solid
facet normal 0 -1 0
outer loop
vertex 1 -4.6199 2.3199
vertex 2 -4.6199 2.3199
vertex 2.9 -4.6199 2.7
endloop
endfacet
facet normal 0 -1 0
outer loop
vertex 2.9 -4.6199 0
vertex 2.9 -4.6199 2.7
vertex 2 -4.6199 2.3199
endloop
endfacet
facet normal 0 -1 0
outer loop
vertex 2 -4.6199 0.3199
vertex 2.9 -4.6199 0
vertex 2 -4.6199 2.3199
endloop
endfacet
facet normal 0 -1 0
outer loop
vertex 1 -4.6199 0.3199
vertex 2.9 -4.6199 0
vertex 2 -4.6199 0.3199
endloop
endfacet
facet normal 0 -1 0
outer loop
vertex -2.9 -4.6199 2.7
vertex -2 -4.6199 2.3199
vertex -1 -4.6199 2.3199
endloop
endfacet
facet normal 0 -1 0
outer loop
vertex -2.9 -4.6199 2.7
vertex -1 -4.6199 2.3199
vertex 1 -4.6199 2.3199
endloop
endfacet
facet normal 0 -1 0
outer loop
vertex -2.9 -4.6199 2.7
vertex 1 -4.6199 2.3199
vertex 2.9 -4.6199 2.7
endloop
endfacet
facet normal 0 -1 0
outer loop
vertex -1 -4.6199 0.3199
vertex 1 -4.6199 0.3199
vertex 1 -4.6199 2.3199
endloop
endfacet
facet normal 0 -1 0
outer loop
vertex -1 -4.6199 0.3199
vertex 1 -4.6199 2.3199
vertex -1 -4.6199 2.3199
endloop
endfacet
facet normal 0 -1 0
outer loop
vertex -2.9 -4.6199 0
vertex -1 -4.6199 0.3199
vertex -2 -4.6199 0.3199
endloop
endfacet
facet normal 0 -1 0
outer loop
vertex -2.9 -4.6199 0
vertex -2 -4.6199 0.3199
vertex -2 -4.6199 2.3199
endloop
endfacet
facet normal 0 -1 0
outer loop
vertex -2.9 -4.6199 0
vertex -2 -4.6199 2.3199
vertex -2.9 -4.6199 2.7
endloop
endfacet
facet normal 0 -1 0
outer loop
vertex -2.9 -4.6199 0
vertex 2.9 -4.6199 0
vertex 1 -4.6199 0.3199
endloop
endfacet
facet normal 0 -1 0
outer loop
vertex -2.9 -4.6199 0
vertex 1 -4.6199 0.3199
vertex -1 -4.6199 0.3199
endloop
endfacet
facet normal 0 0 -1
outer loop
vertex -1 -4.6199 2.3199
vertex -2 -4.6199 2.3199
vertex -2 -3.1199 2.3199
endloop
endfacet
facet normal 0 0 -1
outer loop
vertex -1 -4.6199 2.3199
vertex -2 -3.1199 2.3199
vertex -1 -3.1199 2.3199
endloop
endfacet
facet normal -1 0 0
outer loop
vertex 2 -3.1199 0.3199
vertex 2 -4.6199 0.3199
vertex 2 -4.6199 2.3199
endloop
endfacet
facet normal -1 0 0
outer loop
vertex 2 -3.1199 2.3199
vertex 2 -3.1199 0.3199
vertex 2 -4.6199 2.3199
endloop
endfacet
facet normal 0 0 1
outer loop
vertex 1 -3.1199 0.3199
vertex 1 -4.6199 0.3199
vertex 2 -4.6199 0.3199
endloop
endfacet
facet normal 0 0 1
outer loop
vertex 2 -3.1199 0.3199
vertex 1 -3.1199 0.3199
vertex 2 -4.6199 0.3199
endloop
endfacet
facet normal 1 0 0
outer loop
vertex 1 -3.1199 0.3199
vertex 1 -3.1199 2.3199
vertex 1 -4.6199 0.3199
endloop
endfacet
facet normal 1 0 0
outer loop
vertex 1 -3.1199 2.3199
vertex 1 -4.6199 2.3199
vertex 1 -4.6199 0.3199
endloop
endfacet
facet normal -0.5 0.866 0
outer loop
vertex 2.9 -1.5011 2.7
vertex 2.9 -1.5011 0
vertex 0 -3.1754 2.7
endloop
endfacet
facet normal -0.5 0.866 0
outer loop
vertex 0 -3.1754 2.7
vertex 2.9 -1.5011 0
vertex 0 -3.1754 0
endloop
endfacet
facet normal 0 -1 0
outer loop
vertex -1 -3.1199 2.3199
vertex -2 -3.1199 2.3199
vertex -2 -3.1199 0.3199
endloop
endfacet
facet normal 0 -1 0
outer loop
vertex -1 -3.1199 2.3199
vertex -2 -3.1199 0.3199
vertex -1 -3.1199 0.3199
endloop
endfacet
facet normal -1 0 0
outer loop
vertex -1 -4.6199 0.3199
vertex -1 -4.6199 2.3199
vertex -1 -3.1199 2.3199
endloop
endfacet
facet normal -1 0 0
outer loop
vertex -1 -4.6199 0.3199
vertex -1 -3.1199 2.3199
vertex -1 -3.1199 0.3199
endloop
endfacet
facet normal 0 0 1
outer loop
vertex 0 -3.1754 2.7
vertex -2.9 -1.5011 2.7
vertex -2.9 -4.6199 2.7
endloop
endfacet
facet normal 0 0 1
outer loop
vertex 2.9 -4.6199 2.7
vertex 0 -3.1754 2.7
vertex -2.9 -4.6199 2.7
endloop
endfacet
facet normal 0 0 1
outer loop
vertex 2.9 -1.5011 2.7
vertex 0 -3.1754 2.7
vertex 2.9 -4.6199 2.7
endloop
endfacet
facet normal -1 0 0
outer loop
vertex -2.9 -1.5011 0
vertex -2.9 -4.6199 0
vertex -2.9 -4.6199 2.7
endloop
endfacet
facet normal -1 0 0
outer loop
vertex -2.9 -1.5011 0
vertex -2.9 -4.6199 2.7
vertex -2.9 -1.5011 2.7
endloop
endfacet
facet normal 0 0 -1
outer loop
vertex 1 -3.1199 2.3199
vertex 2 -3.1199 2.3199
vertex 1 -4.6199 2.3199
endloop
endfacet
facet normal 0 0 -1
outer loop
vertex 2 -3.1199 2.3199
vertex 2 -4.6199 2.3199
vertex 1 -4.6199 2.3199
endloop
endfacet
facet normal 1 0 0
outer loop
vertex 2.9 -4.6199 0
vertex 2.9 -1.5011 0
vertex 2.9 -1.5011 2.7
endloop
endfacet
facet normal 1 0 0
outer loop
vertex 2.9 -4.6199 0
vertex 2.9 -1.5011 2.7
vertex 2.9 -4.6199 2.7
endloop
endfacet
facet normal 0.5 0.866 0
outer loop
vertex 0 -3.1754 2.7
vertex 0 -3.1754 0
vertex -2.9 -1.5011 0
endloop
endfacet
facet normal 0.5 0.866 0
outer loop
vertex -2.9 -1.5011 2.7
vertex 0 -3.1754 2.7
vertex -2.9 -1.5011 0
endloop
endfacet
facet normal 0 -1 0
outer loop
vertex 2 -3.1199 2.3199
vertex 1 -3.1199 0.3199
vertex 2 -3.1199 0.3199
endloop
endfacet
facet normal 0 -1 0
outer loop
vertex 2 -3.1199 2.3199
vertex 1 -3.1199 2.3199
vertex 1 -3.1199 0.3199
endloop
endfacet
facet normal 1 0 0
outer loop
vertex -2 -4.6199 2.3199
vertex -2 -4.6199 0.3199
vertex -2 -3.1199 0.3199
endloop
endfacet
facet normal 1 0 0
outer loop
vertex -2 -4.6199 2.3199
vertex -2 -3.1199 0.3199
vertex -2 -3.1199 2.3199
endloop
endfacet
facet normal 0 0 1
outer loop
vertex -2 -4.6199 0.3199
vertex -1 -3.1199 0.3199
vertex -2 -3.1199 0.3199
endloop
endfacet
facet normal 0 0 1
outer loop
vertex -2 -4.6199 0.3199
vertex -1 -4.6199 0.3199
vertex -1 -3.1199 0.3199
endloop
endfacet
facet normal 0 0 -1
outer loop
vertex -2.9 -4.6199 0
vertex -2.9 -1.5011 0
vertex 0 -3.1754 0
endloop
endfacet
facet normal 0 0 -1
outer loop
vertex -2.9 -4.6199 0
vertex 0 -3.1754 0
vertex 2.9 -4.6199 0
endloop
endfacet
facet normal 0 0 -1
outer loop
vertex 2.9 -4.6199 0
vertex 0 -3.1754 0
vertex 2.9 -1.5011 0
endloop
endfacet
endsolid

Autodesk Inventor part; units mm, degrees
ref_plane "YZ Plane" through (0, 0, 0) normal (1, 0, 0) x (0, 1, 0)
ref_plane "XZ Plane" through (0, 0, 0) normal (0, 1, 0) x (-1, 0, 0)
ref_plane "XY Plane" through (0, 0, 0) normal (0, 0, 1) x (1, 0, 0)
sketch "Sketch1" plane through (0, 0, 0) normal (0, 0, 1) x (1, 0, 0)
  line L0 (0, 3.1754) -> (2.9, 1.5011)
  line L1 (2.75, 1.5877) -> (2.75, -1.5877)
  line L2 (2.9, -1.5011) -> (0, -3.1754)
  line L3 (0, -3.1754) -> (-2.9, -1.5011)
  line L4 (-2.75, -1.5877) -> (-2.75, 1.5877)
  line L5 (-2.9, 1.5011) -> (0, 3.1754)
  line L6 (-2.9, 3.1754) -> (2.9, 3.1754)
  line L7 (2.9, 3.1754) -> (2.9, -4.6199)
  line L8 (2.9, -4.6199) -> (-2.9, -4.6199)
  line L9 (-2.9, -4.6199) -> (-2.9, 3.1754)
  point P0 (0, 0)
  point P1 (0, 0)
  point P2 (0, 3.1754)
  dimension "d0" = 5.5
  dimension "d1" = 5.8
  dimension "d2" = 6.121
extrude "Extrusion1" add sketch "Sketch1" along normal blind 2.7 contours L2 L7 L8 L9 L3
sketch "Sketch2" plane through (-2.9, -4.6199, 0) normal (0, -1, 0) x (1, 0, 0)
  line L0 (0.9, 2.3199) -> (1.9, 2.3199)
  line L1 (1.9, 2.3199) -> (1.9, 0.3199)
  line L2 (1.9, 0.3199) -> (0.9, 0.3199)
  line L3 (0.9, 0.3199) -> (0.9, 2.3199)
  line L4 (5.8, 0) -> (2.9, 0) projected
  line L5 (2.9, 0) -> (2.9, 0.3827)
  line L6 (2.9, 0) -> (2.9, 2.7) projected
  line L7 (4.9, 2.3199) -> (3.9, 2.3199)
  line L8 (3.9, 2.3199) -> (3.9, 0.3199)
  line L9 (3.9, 0.3199) -> (4.9, 0.3199)
  line L10 (4.9, 0.3199) -> (4.9, 2.3199)
  dimension "d5" = 1
  dimension "d6" = 1
  dimension "d7" = 2
extrude "Extrusion2" cut sketch "Sketch2" against normal blind 1.5
properties part number "Cepek1"
